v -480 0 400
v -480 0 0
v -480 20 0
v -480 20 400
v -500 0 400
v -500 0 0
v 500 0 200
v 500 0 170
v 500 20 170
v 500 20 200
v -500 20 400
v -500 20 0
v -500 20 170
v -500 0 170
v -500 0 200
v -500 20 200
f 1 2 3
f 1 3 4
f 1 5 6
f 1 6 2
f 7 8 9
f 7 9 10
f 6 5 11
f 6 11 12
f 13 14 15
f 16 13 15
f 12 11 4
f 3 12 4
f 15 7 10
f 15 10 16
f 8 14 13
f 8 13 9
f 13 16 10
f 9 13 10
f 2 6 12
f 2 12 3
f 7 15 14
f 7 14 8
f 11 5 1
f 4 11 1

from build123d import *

# Parameters (mm, degrees)
F0_W     = 20
F0_H     = 30
F0_H_2   = 170
F1_DEPTH = 20
F2_DEPTH = 20


# Not quite as in the source:
# - a feature names something its author has since deleted; it is built from what else it names


with BuildPart() as f1:
    # F0 (on Front) → F1 (new body)
    with BuildSketch(Plane.XZ):
        with Locations((-490, 385)):
            Rectangle(F0_W, F0_H)
        Polygon((-480, 370), (-500, 370), (-500, 200), (-480, 200), (-480, 355), align=None)
        with Locations((-490, 85)):
            Rectangle(F0_W, F0_H_2)
        with Locations((-490, 185)):
            Rectangle(F0_W, F0_H)
    extrude(amount=-F1_DEPTH)


with BuildPart() as f2:
    # F0 (on Front) → F2 (new body)
    with BuildSketch(Plane.XZ):
        Polygon((0, 200), (-480, 200), (-480, 170), (0, 170), (480, 170), (480, 200), align=None)
        with Locations((-490, 185)):
            Rectangle(F0_W, F0_H)
        with Locations((490, 185)):
            Rectangle(F0_W, F0_H)
    extrude(amount=-F2_DEPTH)


solid = Compound([f1.part, f2.part])
